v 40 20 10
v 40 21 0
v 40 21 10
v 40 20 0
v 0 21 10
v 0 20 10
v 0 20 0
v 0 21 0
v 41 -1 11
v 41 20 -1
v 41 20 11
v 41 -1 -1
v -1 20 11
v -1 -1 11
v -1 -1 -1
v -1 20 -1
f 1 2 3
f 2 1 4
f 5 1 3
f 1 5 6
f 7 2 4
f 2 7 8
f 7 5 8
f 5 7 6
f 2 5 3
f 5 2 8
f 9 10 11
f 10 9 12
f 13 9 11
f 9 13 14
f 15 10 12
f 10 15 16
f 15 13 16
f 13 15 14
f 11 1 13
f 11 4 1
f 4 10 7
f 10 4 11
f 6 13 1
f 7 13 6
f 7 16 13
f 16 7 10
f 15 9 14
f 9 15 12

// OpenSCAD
// Unit of length: Unit.MM
union()
{
   color(c = [1.0, 0.0, 0.0, 1.0])
   {
      cube(size = [40.0, 21.0, 10.0], center = false);
   }
   translate(v = [-1.0, -1.0, -1.0])
   {
      cube(size = [42.0, 21.0, 12.0], center = false);
   }
}
